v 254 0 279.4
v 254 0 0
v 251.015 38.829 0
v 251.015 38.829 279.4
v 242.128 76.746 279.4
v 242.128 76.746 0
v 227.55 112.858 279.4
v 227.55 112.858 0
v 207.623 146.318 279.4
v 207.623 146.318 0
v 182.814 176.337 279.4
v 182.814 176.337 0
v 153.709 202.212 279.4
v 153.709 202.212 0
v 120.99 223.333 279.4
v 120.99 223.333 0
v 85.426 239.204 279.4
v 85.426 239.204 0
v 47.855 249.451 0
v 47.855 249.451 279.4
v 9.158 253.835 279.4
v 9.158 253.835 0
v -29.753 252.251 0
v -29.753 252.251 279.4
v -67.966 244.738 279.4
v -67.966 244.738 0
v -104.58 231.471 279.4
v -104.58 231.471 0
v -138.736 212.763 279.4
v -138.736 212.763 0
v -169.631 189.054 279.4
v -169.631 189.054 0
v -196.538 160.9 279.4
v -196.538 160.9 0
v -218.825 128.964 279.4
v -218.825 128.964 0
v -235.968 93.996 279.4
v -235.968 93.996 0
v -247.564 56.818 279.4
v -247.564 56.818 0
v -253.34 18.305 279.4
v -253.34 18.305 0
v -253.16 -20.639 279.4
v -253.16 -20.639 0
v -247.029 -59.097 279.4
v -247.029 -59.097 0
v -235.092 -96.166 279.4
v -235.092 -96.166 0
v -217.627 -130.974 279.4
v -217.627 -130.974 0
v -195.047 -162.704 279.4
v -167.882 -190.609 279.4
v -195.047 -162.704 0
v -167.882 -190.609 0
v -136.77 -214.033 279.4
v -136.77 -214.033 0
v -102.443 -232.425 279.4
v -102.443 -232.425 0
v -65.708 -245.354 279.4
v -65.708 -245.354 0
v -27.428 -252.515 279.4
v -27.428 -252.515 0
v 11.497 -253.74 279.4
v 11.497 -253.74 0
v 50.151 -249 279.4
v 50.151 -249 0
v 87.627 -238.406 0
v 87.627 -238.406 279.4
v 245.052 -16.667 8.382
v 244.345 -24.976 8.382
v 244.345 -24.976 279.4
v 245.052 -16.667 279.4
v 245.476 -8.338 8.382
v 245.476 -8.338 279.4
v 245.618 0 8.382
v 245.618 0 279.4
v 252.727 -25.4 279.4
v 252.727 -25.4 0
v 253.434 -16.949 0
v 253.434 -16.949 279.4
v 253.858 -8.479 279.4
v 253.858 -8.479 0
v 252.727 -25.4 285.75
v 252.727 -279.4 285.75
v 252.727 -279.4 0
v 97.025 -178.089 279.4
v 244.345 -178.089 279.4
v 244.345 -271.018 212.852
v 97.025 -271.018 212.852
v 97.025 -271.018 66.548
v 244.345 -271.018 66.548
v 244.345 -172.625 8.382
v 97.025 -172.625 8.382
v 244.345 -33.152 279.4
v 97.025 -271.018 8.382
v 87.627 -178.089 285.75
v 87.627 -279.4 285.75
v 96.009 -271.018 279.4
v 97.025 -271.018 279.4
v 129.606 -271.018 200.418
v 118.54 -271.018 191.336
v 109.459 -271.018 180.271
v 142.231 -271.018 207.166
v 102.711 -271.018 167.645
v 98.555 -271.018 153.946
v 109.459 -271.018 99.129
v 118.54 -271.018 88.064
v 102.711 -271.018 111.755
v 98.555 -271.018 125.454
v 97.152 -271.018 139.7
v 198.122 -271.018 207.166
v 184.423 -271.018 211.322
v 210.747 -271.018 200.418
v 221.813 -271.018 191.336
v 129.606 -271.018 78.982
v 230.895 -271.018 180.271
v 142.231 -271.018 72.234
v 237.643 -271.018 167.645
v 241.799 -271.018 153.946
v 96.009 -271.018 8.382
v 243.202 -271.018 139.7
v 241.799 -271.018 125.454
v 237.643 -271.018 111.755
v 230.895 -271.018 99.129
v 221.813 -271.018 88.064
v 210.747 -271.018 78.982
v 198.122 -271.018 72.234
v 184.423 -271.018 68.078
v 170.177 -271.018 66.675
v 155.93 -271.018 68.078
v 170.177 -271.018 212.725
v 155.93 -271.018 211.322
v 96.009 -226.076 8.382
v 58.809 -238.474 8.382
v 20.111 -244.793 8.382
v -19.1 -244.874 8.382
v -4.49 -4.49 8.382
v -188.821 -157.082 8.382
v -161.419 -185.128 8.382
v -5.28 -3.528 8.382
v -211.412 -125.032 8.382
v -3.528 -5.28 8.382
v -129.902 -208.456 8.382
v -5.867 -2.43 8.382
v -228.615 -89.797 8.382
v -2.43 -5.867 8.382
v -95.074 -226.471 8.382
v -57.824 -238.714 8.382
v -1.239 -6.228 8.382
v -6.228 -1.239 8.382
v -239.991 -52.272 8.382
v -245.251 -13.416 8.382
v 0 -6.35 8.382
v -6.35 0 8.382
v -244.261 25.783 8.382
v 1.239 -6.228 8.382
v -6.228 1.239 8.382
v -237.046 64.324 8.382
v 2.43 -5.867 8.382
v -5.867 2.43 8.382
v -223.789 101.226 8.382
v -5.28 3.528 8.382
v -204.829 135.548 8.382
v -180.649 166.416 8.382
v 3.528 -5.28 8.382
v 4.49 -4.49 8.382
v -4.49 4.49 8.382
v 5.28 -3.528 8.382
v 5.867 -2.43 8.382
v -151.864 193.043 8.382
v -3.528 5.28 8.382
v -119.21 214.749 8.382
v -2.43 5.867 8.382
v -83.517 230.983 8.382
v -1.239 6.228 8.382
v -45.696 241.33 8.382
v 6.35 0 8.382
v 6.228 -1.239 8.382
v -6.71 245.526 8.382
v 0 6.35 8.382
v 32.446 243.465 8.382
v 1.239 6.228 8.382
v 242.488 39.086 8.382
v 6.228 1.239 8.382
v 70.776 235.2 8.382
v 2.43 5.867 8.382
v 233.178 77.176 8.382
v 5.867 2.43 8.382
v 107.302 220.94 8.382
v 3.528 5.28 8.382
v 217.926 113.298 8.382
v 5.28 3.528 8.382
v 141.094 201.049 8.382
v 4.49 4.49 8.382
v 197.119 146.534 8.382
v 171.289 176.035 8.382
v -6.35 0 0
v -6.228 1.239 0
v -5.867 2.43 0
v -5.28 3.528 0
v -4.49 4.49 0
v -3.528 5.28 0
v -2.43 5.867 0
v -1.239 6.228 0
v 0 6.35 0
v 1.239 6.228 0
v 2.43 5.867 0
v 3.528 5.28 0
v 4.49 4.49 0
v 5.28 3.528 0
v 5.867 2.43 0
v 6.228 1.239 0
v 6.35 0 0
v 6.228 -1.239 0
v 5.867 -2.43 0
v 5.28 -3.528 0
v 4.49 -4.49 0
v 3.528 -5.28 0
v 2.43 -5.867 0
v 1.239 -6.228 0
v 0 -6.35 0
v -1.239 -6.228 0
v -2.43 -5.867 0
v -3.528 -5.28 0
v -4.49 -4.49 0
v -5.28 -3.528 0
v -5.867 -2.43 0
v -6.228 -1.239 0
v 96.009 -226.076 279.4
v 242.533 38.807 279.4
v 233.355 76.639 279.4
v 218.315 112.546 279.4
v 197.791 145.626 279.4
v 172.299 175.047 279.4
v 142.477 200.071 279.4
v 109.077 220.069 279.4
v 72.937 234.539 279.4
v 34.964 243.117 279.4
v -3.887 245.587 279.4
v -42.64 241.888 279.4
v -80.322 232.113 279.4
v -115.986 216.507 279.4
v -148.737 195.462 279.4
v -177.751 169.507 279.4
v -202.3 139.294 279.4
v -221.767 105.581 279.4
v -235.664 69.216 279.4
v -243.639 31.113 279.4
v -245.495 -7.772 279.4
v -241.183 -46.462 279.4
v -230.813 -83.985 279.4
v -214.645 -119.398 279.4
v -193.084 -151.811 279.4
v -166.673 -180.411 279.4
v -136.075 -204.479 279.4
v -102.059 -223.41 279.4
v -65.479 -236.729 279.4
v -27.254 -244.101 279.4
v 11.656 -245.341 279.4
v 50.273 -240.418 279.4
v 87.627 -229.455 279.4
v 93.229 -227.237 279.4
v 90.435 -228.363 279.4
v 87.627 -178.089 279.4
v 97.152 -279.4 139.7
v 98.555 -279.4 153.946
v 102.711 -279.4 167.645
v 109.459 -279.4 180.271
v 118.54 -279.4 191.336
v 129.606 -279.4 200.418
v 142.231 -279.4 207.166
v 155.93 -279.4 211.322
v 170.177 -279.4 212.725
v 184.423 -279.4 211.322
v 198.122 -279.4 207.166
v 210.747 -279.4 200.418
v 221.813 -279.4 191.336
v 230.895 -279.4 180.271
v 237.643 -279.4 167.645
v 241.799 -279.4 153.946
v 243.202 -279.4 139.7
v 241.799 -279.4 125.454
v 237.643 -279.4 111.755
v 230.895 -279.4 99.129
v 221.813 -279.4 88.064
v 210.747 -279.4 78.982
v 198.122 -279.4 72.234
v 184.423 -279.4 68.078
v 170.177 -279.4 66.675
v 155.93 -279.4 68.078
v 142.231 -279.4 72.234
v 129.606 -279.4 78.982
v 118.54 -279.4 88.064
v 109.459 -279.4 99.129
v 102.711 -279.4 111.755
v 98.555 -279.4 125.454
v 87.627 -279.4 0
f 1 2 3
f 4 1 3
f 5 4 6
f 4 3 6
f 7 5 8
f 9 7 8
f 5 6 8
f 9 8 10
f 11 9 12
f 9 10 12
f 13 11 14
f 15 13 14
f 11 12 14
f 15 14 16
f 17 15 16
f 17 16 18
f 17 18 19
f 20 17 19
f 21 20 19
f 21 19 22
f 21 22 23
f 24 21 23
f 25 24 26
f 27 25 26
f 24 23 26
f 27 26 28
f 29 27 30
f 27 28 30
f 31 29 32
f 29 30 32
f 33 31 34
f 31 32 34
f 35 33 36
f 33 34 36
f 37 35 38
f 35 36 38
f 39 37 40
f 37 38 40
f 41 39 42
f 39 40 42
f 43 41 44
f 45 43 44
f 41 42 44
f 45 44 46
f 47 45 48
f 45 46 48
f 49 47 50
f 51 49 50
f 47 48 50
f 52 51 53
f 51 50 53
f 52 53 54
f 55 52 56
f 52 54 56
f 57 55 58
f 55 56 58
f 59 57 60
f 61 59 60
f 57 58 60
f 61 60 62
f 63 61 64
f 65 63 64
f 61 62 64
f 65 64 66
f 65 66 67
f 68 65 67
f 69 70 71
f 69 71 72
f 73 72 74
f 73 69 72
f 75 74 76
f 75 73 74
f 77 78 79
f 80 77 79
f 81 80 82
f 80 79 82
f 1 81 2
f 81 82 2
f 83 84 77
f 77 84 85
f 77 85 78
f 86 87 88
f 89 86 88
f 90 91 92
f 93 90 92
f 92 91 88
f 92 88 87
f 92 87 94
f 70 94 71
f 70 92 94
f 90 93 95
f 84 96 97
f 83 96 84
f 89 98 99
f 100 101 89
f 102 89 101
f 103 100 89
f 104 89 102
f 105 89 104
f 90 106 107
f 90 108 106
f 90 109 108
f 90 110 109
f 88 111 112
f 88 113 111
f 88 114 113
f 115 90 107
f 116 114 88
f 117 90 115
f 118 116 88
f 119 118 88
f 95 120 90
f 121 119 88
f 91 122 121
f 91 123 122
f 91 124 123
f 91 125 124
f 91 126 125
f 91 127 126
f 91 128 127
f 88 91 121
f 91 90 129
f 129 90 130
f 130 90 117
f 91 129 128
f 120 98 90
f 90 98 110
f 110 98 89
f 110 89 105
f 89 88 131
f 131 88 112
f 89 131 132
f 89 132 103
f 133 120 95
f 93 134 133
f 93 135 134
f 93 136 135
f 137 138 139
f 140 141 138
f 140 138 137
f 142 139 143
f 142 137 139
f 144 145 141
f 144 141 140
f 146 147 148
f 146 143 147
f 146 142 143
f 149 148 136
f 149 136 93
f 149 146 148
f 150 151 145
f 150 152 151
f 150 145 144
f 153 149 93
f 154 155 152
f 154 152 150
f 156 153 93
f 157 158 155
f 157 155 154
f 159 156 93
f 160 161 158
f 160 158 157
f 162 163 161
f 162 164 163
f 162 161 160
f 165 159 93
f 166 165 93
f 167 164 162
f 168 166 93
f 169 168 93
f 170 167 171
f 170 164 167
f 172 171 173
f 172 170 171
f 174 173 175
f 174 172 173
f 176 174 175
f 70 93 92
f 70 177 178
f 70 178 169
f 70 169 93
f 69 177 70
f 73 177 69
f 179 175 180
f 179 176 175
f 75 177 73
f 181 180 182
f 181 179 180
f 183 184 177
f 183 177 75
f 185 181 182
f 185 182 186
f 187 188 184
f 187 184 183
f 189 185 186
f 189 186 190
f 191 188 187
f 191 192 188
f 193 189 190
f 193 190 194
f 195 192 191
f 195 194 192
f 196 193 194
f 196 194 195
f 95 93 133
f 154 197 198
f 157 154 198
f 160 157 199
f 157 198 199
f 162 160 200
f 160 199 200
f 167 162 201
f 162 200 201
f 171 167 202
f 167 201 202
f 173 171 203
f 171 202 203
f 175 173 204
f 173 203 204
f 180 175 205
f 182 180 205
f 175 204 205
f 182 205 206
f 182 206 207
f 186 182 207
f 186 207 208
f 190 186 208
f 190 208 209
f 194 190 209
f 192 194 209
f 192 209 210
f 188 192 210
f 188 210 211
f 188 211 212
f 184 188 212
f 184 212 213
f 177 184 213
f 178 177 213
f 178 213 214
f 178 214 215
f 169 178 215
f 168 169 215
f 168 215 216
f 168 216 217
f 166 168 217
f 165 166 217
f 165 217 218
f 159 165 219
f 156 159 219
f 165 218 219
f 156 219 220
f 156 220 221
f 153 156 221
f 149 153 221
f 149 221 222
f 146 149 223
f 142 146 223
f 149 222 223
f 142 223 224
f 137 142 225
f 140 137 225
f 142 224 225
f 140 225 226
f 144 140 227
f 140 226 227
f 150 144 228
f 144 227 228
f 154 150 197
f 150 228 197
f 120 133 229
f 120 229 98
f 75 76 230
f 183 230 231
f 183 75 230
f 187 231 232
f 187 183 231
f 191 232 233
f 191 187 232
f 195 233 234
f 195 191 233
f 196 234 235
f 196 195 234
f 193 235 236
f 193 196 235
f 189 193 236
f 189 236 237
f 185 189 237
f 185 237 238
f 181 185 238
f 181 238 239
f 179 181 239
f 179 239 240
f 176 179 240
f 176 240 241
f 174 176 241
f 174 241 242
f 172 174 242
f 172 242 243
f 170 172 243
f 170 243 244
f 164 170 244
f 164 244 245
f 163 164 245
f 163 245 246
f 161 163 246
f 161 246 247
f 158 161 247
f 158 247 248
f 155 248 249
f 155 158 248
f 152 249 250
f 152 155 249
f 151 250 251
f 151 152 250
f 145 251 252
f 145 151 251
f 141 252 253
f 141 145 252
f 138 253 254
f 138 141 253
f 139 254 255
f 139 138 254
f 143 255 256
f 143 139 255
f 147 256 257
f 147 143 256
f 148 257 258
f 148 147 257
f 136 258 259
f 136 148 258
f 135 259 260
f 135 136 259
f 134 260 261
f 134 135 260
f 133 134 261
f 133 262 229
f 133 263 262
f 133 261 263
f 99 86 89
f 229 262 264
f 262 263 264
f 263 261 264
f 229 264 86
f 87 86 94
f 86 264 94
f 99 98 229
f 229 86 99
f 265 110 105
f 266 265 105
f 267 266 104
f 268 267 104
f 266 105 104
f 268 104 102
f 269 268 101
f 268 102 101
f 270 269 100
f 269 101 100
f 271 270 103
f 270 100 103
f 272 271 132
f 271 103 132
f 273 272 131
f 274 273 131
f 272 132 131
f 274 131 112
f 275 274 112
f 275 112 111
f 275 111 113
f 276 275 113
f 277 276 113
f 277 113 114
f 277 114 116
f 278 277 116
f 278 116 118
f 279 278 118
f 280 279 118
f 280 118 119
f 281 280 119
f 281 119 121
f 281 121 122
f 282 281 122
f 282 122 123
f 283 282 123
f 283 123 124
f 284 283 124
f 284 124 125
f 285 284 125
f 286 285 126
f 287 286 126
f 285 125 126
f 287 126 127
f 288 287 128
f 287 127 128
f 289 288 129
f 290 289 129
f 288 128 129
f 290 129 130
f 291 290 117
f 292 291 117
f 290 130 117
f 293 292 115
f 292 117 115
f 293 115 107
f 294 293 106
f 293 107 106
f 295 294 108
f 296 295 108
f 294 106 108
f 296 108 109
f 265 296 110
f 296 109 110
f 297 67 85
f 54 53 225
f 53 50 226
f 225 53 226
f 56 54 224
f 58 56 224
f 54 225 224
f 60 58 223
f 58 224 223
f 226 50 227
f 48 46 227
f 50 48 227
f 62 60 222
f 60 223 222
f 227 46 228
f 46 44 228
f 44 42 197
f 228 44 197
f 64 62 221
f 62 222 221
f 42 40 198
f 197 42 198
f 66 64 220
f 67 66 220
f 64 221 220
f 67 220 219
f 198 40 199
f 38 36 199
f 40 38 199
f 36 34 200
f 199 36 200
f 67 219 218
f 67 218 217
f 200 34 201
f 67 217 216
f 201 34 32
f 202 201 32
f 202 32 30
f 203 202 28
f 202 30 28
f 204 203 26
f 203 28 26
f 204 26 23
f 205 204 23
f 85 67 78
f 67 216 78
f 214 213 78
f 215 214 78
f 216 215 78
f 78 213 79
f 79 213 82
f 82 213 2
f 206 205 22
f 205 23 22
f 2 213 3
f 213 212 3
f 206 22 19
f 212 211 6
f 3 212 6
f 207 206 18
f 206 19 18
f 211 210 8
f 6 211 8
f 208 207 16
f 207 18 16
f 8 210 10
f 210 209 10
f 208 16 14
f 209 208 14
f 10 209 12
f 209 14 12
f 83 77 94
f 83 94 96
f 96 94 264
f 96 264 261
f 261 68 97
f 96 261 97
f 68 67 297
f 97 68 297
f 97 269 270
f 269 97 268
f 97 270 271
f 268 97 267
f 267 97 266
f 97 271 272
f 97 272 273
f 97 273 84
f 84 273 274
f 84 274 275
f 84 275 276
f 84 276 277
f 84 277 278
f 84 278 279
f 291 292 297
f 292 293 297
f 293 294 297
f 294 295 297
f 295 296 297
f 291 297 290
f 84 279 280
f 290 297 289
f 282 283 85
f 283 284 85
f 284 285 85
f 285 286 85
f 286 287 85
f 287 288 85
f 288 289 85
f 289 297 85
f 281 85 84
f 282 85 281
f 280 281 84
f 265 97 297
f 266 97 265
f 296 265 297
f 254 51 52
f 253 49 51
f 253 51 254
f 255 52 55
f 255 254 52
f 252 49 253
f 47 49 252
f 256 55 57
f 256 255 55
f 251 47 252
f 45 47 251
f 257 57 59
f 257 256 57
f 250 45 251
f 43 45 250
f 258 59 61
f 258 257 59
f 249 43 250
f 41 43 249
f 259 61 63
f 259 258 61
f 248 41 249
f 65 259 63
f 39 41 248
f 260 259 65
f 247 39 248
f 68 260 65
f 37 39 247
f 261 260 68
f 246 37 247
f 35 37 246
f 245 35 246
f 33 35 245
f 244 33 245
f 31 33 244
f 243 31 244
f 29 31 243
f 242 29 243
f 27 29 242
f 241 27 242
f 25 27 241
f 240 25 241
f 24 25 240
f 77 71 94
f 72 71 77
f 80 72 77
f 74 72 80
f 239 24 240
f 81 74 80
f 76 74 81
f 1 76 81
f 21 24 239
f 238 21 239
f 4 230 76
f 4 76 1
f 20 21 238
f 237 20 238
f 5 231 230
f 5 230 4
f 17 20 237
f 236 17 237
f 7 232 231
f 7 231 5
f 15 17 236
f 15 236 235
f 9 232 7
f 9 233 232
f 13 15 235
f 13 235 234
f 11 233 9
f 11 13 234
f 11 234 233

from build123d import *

# Parameters (mm, degrees)
F1_DEPTH  = 279.4
F3_T      = -8.382
F4_D      = 146.05
F4_DEPTH  = 12.7
F4_TIP    = 43.8778467045
F6_DEPTH  = 147.32
F8_DEPTH  = 6.35
F10_D     = 12.7
F10_DEPTH = 12.7
F10_TIP   = 3.8154649308


with BuildPart() as f1:
    # F0 (on Top) → F1 (new body)
    with BuildSketch(Plane.XY):
        with BuildLine():
            Line((87.6268090251, -25.4), (252.7268090251, -25.4))
            ThreePointArc((252.7268090251, -25.4), (253.68150257, -12.7159448652), (254, 0))
            ThreePointArc((254, 0), (-208.2945144409, 145.3595378839), (87.6268090251, -238.4062548258))
            Line((87.6268090251, -238.4062548258), (87.6268090251, -25.4))
        make_face()
        with BuildLine():
            ThreePointArc((87.6268090251, -238.4062548258), (200.7562265004, -155.6050690733), (252.7268090251, -25.4))
            Line((252.7268090251, -25.4), (87.6268090251, -25.4))
            Line((87.6268090251, -25.4), (87.6268090251, -238.4062548258))
        make_face()
        with BuildLine():
            Line((252.7268090251, -279.4), (252.7268090251, -25.4))
            ThreePointArc((252.7268090251, -25.4), (200.7562265004, -155.6050690733), (87.6268090251, -238.4062548258))
            Line((87.6268090251, -238.4062548258), (87.6268090251, -279.4))
            Line((87.6268090251, -279.4), (252.7268090251, -279.4))
        make_face()
    extrude(amount=F1_DEPTH)

    # F3
    f3_openings = [f1.faces().sort_by_distance(p)[0] for p in [
        (15.178098, -16.804954, 279.4),
    ]]
    offset(amount=F3_T, openings=f3_openings, kind=Kind.INTERSECTION)

    # F4
    with Locations(Plane.XZ.offset(279.4)):
        with Locations((170.1768090251, 139.7)):
            Hole(F4_D / 2, depth=F4_DEPTH)
            with Locations((0, 0, -(F4_DEPTH + F4_TIP / 2))):  # 118° drill point
                Cone(0, F4_D / 2, F4_TIP, mode=Mode.SUBTRACT)

    # F5 (on face) → F6 (join)
    with BuildSketch(Plane(origin=(244.3448090251, 0, 0), x_dir=(0, -1, 0), z_dir=(-1, 0, 0))):
        Polygon((271.018, 66.548), (172.6248780656, 8.382), (271.018, 8.382), align=None)
        Polygon((271.018, 212.852), (271.018, 279.4), (178.0887059319, 279.4), align=None)
    extrude(amount=F6_DEPTH)

    # F7 (on face) → F8 (join)
    with BuildSketch(Plane.XY.offset(279.4)):
        Polygon((87.6268090251, -178.0887059319), (87.6268090251, -279.4), (252.7268090251, -279.4), (252.7268090251, -25.4), align=None)
    extrude(amount=F8_DEPTH)

    # F10
    with Locations(Plane.XY.offset(8.382)):
        with Locations((0, 0)):
            Hole(F10_D / 2, depth=F10_DEPTH)
            with Locations((0, 0, -(F10_DEPTH + F10_TIP / 2))):  # 118° drill point
                Cone(0, F10_D / 2, F10_TIP, mode=Mode.SUBTRACT)


solid = f1.part
